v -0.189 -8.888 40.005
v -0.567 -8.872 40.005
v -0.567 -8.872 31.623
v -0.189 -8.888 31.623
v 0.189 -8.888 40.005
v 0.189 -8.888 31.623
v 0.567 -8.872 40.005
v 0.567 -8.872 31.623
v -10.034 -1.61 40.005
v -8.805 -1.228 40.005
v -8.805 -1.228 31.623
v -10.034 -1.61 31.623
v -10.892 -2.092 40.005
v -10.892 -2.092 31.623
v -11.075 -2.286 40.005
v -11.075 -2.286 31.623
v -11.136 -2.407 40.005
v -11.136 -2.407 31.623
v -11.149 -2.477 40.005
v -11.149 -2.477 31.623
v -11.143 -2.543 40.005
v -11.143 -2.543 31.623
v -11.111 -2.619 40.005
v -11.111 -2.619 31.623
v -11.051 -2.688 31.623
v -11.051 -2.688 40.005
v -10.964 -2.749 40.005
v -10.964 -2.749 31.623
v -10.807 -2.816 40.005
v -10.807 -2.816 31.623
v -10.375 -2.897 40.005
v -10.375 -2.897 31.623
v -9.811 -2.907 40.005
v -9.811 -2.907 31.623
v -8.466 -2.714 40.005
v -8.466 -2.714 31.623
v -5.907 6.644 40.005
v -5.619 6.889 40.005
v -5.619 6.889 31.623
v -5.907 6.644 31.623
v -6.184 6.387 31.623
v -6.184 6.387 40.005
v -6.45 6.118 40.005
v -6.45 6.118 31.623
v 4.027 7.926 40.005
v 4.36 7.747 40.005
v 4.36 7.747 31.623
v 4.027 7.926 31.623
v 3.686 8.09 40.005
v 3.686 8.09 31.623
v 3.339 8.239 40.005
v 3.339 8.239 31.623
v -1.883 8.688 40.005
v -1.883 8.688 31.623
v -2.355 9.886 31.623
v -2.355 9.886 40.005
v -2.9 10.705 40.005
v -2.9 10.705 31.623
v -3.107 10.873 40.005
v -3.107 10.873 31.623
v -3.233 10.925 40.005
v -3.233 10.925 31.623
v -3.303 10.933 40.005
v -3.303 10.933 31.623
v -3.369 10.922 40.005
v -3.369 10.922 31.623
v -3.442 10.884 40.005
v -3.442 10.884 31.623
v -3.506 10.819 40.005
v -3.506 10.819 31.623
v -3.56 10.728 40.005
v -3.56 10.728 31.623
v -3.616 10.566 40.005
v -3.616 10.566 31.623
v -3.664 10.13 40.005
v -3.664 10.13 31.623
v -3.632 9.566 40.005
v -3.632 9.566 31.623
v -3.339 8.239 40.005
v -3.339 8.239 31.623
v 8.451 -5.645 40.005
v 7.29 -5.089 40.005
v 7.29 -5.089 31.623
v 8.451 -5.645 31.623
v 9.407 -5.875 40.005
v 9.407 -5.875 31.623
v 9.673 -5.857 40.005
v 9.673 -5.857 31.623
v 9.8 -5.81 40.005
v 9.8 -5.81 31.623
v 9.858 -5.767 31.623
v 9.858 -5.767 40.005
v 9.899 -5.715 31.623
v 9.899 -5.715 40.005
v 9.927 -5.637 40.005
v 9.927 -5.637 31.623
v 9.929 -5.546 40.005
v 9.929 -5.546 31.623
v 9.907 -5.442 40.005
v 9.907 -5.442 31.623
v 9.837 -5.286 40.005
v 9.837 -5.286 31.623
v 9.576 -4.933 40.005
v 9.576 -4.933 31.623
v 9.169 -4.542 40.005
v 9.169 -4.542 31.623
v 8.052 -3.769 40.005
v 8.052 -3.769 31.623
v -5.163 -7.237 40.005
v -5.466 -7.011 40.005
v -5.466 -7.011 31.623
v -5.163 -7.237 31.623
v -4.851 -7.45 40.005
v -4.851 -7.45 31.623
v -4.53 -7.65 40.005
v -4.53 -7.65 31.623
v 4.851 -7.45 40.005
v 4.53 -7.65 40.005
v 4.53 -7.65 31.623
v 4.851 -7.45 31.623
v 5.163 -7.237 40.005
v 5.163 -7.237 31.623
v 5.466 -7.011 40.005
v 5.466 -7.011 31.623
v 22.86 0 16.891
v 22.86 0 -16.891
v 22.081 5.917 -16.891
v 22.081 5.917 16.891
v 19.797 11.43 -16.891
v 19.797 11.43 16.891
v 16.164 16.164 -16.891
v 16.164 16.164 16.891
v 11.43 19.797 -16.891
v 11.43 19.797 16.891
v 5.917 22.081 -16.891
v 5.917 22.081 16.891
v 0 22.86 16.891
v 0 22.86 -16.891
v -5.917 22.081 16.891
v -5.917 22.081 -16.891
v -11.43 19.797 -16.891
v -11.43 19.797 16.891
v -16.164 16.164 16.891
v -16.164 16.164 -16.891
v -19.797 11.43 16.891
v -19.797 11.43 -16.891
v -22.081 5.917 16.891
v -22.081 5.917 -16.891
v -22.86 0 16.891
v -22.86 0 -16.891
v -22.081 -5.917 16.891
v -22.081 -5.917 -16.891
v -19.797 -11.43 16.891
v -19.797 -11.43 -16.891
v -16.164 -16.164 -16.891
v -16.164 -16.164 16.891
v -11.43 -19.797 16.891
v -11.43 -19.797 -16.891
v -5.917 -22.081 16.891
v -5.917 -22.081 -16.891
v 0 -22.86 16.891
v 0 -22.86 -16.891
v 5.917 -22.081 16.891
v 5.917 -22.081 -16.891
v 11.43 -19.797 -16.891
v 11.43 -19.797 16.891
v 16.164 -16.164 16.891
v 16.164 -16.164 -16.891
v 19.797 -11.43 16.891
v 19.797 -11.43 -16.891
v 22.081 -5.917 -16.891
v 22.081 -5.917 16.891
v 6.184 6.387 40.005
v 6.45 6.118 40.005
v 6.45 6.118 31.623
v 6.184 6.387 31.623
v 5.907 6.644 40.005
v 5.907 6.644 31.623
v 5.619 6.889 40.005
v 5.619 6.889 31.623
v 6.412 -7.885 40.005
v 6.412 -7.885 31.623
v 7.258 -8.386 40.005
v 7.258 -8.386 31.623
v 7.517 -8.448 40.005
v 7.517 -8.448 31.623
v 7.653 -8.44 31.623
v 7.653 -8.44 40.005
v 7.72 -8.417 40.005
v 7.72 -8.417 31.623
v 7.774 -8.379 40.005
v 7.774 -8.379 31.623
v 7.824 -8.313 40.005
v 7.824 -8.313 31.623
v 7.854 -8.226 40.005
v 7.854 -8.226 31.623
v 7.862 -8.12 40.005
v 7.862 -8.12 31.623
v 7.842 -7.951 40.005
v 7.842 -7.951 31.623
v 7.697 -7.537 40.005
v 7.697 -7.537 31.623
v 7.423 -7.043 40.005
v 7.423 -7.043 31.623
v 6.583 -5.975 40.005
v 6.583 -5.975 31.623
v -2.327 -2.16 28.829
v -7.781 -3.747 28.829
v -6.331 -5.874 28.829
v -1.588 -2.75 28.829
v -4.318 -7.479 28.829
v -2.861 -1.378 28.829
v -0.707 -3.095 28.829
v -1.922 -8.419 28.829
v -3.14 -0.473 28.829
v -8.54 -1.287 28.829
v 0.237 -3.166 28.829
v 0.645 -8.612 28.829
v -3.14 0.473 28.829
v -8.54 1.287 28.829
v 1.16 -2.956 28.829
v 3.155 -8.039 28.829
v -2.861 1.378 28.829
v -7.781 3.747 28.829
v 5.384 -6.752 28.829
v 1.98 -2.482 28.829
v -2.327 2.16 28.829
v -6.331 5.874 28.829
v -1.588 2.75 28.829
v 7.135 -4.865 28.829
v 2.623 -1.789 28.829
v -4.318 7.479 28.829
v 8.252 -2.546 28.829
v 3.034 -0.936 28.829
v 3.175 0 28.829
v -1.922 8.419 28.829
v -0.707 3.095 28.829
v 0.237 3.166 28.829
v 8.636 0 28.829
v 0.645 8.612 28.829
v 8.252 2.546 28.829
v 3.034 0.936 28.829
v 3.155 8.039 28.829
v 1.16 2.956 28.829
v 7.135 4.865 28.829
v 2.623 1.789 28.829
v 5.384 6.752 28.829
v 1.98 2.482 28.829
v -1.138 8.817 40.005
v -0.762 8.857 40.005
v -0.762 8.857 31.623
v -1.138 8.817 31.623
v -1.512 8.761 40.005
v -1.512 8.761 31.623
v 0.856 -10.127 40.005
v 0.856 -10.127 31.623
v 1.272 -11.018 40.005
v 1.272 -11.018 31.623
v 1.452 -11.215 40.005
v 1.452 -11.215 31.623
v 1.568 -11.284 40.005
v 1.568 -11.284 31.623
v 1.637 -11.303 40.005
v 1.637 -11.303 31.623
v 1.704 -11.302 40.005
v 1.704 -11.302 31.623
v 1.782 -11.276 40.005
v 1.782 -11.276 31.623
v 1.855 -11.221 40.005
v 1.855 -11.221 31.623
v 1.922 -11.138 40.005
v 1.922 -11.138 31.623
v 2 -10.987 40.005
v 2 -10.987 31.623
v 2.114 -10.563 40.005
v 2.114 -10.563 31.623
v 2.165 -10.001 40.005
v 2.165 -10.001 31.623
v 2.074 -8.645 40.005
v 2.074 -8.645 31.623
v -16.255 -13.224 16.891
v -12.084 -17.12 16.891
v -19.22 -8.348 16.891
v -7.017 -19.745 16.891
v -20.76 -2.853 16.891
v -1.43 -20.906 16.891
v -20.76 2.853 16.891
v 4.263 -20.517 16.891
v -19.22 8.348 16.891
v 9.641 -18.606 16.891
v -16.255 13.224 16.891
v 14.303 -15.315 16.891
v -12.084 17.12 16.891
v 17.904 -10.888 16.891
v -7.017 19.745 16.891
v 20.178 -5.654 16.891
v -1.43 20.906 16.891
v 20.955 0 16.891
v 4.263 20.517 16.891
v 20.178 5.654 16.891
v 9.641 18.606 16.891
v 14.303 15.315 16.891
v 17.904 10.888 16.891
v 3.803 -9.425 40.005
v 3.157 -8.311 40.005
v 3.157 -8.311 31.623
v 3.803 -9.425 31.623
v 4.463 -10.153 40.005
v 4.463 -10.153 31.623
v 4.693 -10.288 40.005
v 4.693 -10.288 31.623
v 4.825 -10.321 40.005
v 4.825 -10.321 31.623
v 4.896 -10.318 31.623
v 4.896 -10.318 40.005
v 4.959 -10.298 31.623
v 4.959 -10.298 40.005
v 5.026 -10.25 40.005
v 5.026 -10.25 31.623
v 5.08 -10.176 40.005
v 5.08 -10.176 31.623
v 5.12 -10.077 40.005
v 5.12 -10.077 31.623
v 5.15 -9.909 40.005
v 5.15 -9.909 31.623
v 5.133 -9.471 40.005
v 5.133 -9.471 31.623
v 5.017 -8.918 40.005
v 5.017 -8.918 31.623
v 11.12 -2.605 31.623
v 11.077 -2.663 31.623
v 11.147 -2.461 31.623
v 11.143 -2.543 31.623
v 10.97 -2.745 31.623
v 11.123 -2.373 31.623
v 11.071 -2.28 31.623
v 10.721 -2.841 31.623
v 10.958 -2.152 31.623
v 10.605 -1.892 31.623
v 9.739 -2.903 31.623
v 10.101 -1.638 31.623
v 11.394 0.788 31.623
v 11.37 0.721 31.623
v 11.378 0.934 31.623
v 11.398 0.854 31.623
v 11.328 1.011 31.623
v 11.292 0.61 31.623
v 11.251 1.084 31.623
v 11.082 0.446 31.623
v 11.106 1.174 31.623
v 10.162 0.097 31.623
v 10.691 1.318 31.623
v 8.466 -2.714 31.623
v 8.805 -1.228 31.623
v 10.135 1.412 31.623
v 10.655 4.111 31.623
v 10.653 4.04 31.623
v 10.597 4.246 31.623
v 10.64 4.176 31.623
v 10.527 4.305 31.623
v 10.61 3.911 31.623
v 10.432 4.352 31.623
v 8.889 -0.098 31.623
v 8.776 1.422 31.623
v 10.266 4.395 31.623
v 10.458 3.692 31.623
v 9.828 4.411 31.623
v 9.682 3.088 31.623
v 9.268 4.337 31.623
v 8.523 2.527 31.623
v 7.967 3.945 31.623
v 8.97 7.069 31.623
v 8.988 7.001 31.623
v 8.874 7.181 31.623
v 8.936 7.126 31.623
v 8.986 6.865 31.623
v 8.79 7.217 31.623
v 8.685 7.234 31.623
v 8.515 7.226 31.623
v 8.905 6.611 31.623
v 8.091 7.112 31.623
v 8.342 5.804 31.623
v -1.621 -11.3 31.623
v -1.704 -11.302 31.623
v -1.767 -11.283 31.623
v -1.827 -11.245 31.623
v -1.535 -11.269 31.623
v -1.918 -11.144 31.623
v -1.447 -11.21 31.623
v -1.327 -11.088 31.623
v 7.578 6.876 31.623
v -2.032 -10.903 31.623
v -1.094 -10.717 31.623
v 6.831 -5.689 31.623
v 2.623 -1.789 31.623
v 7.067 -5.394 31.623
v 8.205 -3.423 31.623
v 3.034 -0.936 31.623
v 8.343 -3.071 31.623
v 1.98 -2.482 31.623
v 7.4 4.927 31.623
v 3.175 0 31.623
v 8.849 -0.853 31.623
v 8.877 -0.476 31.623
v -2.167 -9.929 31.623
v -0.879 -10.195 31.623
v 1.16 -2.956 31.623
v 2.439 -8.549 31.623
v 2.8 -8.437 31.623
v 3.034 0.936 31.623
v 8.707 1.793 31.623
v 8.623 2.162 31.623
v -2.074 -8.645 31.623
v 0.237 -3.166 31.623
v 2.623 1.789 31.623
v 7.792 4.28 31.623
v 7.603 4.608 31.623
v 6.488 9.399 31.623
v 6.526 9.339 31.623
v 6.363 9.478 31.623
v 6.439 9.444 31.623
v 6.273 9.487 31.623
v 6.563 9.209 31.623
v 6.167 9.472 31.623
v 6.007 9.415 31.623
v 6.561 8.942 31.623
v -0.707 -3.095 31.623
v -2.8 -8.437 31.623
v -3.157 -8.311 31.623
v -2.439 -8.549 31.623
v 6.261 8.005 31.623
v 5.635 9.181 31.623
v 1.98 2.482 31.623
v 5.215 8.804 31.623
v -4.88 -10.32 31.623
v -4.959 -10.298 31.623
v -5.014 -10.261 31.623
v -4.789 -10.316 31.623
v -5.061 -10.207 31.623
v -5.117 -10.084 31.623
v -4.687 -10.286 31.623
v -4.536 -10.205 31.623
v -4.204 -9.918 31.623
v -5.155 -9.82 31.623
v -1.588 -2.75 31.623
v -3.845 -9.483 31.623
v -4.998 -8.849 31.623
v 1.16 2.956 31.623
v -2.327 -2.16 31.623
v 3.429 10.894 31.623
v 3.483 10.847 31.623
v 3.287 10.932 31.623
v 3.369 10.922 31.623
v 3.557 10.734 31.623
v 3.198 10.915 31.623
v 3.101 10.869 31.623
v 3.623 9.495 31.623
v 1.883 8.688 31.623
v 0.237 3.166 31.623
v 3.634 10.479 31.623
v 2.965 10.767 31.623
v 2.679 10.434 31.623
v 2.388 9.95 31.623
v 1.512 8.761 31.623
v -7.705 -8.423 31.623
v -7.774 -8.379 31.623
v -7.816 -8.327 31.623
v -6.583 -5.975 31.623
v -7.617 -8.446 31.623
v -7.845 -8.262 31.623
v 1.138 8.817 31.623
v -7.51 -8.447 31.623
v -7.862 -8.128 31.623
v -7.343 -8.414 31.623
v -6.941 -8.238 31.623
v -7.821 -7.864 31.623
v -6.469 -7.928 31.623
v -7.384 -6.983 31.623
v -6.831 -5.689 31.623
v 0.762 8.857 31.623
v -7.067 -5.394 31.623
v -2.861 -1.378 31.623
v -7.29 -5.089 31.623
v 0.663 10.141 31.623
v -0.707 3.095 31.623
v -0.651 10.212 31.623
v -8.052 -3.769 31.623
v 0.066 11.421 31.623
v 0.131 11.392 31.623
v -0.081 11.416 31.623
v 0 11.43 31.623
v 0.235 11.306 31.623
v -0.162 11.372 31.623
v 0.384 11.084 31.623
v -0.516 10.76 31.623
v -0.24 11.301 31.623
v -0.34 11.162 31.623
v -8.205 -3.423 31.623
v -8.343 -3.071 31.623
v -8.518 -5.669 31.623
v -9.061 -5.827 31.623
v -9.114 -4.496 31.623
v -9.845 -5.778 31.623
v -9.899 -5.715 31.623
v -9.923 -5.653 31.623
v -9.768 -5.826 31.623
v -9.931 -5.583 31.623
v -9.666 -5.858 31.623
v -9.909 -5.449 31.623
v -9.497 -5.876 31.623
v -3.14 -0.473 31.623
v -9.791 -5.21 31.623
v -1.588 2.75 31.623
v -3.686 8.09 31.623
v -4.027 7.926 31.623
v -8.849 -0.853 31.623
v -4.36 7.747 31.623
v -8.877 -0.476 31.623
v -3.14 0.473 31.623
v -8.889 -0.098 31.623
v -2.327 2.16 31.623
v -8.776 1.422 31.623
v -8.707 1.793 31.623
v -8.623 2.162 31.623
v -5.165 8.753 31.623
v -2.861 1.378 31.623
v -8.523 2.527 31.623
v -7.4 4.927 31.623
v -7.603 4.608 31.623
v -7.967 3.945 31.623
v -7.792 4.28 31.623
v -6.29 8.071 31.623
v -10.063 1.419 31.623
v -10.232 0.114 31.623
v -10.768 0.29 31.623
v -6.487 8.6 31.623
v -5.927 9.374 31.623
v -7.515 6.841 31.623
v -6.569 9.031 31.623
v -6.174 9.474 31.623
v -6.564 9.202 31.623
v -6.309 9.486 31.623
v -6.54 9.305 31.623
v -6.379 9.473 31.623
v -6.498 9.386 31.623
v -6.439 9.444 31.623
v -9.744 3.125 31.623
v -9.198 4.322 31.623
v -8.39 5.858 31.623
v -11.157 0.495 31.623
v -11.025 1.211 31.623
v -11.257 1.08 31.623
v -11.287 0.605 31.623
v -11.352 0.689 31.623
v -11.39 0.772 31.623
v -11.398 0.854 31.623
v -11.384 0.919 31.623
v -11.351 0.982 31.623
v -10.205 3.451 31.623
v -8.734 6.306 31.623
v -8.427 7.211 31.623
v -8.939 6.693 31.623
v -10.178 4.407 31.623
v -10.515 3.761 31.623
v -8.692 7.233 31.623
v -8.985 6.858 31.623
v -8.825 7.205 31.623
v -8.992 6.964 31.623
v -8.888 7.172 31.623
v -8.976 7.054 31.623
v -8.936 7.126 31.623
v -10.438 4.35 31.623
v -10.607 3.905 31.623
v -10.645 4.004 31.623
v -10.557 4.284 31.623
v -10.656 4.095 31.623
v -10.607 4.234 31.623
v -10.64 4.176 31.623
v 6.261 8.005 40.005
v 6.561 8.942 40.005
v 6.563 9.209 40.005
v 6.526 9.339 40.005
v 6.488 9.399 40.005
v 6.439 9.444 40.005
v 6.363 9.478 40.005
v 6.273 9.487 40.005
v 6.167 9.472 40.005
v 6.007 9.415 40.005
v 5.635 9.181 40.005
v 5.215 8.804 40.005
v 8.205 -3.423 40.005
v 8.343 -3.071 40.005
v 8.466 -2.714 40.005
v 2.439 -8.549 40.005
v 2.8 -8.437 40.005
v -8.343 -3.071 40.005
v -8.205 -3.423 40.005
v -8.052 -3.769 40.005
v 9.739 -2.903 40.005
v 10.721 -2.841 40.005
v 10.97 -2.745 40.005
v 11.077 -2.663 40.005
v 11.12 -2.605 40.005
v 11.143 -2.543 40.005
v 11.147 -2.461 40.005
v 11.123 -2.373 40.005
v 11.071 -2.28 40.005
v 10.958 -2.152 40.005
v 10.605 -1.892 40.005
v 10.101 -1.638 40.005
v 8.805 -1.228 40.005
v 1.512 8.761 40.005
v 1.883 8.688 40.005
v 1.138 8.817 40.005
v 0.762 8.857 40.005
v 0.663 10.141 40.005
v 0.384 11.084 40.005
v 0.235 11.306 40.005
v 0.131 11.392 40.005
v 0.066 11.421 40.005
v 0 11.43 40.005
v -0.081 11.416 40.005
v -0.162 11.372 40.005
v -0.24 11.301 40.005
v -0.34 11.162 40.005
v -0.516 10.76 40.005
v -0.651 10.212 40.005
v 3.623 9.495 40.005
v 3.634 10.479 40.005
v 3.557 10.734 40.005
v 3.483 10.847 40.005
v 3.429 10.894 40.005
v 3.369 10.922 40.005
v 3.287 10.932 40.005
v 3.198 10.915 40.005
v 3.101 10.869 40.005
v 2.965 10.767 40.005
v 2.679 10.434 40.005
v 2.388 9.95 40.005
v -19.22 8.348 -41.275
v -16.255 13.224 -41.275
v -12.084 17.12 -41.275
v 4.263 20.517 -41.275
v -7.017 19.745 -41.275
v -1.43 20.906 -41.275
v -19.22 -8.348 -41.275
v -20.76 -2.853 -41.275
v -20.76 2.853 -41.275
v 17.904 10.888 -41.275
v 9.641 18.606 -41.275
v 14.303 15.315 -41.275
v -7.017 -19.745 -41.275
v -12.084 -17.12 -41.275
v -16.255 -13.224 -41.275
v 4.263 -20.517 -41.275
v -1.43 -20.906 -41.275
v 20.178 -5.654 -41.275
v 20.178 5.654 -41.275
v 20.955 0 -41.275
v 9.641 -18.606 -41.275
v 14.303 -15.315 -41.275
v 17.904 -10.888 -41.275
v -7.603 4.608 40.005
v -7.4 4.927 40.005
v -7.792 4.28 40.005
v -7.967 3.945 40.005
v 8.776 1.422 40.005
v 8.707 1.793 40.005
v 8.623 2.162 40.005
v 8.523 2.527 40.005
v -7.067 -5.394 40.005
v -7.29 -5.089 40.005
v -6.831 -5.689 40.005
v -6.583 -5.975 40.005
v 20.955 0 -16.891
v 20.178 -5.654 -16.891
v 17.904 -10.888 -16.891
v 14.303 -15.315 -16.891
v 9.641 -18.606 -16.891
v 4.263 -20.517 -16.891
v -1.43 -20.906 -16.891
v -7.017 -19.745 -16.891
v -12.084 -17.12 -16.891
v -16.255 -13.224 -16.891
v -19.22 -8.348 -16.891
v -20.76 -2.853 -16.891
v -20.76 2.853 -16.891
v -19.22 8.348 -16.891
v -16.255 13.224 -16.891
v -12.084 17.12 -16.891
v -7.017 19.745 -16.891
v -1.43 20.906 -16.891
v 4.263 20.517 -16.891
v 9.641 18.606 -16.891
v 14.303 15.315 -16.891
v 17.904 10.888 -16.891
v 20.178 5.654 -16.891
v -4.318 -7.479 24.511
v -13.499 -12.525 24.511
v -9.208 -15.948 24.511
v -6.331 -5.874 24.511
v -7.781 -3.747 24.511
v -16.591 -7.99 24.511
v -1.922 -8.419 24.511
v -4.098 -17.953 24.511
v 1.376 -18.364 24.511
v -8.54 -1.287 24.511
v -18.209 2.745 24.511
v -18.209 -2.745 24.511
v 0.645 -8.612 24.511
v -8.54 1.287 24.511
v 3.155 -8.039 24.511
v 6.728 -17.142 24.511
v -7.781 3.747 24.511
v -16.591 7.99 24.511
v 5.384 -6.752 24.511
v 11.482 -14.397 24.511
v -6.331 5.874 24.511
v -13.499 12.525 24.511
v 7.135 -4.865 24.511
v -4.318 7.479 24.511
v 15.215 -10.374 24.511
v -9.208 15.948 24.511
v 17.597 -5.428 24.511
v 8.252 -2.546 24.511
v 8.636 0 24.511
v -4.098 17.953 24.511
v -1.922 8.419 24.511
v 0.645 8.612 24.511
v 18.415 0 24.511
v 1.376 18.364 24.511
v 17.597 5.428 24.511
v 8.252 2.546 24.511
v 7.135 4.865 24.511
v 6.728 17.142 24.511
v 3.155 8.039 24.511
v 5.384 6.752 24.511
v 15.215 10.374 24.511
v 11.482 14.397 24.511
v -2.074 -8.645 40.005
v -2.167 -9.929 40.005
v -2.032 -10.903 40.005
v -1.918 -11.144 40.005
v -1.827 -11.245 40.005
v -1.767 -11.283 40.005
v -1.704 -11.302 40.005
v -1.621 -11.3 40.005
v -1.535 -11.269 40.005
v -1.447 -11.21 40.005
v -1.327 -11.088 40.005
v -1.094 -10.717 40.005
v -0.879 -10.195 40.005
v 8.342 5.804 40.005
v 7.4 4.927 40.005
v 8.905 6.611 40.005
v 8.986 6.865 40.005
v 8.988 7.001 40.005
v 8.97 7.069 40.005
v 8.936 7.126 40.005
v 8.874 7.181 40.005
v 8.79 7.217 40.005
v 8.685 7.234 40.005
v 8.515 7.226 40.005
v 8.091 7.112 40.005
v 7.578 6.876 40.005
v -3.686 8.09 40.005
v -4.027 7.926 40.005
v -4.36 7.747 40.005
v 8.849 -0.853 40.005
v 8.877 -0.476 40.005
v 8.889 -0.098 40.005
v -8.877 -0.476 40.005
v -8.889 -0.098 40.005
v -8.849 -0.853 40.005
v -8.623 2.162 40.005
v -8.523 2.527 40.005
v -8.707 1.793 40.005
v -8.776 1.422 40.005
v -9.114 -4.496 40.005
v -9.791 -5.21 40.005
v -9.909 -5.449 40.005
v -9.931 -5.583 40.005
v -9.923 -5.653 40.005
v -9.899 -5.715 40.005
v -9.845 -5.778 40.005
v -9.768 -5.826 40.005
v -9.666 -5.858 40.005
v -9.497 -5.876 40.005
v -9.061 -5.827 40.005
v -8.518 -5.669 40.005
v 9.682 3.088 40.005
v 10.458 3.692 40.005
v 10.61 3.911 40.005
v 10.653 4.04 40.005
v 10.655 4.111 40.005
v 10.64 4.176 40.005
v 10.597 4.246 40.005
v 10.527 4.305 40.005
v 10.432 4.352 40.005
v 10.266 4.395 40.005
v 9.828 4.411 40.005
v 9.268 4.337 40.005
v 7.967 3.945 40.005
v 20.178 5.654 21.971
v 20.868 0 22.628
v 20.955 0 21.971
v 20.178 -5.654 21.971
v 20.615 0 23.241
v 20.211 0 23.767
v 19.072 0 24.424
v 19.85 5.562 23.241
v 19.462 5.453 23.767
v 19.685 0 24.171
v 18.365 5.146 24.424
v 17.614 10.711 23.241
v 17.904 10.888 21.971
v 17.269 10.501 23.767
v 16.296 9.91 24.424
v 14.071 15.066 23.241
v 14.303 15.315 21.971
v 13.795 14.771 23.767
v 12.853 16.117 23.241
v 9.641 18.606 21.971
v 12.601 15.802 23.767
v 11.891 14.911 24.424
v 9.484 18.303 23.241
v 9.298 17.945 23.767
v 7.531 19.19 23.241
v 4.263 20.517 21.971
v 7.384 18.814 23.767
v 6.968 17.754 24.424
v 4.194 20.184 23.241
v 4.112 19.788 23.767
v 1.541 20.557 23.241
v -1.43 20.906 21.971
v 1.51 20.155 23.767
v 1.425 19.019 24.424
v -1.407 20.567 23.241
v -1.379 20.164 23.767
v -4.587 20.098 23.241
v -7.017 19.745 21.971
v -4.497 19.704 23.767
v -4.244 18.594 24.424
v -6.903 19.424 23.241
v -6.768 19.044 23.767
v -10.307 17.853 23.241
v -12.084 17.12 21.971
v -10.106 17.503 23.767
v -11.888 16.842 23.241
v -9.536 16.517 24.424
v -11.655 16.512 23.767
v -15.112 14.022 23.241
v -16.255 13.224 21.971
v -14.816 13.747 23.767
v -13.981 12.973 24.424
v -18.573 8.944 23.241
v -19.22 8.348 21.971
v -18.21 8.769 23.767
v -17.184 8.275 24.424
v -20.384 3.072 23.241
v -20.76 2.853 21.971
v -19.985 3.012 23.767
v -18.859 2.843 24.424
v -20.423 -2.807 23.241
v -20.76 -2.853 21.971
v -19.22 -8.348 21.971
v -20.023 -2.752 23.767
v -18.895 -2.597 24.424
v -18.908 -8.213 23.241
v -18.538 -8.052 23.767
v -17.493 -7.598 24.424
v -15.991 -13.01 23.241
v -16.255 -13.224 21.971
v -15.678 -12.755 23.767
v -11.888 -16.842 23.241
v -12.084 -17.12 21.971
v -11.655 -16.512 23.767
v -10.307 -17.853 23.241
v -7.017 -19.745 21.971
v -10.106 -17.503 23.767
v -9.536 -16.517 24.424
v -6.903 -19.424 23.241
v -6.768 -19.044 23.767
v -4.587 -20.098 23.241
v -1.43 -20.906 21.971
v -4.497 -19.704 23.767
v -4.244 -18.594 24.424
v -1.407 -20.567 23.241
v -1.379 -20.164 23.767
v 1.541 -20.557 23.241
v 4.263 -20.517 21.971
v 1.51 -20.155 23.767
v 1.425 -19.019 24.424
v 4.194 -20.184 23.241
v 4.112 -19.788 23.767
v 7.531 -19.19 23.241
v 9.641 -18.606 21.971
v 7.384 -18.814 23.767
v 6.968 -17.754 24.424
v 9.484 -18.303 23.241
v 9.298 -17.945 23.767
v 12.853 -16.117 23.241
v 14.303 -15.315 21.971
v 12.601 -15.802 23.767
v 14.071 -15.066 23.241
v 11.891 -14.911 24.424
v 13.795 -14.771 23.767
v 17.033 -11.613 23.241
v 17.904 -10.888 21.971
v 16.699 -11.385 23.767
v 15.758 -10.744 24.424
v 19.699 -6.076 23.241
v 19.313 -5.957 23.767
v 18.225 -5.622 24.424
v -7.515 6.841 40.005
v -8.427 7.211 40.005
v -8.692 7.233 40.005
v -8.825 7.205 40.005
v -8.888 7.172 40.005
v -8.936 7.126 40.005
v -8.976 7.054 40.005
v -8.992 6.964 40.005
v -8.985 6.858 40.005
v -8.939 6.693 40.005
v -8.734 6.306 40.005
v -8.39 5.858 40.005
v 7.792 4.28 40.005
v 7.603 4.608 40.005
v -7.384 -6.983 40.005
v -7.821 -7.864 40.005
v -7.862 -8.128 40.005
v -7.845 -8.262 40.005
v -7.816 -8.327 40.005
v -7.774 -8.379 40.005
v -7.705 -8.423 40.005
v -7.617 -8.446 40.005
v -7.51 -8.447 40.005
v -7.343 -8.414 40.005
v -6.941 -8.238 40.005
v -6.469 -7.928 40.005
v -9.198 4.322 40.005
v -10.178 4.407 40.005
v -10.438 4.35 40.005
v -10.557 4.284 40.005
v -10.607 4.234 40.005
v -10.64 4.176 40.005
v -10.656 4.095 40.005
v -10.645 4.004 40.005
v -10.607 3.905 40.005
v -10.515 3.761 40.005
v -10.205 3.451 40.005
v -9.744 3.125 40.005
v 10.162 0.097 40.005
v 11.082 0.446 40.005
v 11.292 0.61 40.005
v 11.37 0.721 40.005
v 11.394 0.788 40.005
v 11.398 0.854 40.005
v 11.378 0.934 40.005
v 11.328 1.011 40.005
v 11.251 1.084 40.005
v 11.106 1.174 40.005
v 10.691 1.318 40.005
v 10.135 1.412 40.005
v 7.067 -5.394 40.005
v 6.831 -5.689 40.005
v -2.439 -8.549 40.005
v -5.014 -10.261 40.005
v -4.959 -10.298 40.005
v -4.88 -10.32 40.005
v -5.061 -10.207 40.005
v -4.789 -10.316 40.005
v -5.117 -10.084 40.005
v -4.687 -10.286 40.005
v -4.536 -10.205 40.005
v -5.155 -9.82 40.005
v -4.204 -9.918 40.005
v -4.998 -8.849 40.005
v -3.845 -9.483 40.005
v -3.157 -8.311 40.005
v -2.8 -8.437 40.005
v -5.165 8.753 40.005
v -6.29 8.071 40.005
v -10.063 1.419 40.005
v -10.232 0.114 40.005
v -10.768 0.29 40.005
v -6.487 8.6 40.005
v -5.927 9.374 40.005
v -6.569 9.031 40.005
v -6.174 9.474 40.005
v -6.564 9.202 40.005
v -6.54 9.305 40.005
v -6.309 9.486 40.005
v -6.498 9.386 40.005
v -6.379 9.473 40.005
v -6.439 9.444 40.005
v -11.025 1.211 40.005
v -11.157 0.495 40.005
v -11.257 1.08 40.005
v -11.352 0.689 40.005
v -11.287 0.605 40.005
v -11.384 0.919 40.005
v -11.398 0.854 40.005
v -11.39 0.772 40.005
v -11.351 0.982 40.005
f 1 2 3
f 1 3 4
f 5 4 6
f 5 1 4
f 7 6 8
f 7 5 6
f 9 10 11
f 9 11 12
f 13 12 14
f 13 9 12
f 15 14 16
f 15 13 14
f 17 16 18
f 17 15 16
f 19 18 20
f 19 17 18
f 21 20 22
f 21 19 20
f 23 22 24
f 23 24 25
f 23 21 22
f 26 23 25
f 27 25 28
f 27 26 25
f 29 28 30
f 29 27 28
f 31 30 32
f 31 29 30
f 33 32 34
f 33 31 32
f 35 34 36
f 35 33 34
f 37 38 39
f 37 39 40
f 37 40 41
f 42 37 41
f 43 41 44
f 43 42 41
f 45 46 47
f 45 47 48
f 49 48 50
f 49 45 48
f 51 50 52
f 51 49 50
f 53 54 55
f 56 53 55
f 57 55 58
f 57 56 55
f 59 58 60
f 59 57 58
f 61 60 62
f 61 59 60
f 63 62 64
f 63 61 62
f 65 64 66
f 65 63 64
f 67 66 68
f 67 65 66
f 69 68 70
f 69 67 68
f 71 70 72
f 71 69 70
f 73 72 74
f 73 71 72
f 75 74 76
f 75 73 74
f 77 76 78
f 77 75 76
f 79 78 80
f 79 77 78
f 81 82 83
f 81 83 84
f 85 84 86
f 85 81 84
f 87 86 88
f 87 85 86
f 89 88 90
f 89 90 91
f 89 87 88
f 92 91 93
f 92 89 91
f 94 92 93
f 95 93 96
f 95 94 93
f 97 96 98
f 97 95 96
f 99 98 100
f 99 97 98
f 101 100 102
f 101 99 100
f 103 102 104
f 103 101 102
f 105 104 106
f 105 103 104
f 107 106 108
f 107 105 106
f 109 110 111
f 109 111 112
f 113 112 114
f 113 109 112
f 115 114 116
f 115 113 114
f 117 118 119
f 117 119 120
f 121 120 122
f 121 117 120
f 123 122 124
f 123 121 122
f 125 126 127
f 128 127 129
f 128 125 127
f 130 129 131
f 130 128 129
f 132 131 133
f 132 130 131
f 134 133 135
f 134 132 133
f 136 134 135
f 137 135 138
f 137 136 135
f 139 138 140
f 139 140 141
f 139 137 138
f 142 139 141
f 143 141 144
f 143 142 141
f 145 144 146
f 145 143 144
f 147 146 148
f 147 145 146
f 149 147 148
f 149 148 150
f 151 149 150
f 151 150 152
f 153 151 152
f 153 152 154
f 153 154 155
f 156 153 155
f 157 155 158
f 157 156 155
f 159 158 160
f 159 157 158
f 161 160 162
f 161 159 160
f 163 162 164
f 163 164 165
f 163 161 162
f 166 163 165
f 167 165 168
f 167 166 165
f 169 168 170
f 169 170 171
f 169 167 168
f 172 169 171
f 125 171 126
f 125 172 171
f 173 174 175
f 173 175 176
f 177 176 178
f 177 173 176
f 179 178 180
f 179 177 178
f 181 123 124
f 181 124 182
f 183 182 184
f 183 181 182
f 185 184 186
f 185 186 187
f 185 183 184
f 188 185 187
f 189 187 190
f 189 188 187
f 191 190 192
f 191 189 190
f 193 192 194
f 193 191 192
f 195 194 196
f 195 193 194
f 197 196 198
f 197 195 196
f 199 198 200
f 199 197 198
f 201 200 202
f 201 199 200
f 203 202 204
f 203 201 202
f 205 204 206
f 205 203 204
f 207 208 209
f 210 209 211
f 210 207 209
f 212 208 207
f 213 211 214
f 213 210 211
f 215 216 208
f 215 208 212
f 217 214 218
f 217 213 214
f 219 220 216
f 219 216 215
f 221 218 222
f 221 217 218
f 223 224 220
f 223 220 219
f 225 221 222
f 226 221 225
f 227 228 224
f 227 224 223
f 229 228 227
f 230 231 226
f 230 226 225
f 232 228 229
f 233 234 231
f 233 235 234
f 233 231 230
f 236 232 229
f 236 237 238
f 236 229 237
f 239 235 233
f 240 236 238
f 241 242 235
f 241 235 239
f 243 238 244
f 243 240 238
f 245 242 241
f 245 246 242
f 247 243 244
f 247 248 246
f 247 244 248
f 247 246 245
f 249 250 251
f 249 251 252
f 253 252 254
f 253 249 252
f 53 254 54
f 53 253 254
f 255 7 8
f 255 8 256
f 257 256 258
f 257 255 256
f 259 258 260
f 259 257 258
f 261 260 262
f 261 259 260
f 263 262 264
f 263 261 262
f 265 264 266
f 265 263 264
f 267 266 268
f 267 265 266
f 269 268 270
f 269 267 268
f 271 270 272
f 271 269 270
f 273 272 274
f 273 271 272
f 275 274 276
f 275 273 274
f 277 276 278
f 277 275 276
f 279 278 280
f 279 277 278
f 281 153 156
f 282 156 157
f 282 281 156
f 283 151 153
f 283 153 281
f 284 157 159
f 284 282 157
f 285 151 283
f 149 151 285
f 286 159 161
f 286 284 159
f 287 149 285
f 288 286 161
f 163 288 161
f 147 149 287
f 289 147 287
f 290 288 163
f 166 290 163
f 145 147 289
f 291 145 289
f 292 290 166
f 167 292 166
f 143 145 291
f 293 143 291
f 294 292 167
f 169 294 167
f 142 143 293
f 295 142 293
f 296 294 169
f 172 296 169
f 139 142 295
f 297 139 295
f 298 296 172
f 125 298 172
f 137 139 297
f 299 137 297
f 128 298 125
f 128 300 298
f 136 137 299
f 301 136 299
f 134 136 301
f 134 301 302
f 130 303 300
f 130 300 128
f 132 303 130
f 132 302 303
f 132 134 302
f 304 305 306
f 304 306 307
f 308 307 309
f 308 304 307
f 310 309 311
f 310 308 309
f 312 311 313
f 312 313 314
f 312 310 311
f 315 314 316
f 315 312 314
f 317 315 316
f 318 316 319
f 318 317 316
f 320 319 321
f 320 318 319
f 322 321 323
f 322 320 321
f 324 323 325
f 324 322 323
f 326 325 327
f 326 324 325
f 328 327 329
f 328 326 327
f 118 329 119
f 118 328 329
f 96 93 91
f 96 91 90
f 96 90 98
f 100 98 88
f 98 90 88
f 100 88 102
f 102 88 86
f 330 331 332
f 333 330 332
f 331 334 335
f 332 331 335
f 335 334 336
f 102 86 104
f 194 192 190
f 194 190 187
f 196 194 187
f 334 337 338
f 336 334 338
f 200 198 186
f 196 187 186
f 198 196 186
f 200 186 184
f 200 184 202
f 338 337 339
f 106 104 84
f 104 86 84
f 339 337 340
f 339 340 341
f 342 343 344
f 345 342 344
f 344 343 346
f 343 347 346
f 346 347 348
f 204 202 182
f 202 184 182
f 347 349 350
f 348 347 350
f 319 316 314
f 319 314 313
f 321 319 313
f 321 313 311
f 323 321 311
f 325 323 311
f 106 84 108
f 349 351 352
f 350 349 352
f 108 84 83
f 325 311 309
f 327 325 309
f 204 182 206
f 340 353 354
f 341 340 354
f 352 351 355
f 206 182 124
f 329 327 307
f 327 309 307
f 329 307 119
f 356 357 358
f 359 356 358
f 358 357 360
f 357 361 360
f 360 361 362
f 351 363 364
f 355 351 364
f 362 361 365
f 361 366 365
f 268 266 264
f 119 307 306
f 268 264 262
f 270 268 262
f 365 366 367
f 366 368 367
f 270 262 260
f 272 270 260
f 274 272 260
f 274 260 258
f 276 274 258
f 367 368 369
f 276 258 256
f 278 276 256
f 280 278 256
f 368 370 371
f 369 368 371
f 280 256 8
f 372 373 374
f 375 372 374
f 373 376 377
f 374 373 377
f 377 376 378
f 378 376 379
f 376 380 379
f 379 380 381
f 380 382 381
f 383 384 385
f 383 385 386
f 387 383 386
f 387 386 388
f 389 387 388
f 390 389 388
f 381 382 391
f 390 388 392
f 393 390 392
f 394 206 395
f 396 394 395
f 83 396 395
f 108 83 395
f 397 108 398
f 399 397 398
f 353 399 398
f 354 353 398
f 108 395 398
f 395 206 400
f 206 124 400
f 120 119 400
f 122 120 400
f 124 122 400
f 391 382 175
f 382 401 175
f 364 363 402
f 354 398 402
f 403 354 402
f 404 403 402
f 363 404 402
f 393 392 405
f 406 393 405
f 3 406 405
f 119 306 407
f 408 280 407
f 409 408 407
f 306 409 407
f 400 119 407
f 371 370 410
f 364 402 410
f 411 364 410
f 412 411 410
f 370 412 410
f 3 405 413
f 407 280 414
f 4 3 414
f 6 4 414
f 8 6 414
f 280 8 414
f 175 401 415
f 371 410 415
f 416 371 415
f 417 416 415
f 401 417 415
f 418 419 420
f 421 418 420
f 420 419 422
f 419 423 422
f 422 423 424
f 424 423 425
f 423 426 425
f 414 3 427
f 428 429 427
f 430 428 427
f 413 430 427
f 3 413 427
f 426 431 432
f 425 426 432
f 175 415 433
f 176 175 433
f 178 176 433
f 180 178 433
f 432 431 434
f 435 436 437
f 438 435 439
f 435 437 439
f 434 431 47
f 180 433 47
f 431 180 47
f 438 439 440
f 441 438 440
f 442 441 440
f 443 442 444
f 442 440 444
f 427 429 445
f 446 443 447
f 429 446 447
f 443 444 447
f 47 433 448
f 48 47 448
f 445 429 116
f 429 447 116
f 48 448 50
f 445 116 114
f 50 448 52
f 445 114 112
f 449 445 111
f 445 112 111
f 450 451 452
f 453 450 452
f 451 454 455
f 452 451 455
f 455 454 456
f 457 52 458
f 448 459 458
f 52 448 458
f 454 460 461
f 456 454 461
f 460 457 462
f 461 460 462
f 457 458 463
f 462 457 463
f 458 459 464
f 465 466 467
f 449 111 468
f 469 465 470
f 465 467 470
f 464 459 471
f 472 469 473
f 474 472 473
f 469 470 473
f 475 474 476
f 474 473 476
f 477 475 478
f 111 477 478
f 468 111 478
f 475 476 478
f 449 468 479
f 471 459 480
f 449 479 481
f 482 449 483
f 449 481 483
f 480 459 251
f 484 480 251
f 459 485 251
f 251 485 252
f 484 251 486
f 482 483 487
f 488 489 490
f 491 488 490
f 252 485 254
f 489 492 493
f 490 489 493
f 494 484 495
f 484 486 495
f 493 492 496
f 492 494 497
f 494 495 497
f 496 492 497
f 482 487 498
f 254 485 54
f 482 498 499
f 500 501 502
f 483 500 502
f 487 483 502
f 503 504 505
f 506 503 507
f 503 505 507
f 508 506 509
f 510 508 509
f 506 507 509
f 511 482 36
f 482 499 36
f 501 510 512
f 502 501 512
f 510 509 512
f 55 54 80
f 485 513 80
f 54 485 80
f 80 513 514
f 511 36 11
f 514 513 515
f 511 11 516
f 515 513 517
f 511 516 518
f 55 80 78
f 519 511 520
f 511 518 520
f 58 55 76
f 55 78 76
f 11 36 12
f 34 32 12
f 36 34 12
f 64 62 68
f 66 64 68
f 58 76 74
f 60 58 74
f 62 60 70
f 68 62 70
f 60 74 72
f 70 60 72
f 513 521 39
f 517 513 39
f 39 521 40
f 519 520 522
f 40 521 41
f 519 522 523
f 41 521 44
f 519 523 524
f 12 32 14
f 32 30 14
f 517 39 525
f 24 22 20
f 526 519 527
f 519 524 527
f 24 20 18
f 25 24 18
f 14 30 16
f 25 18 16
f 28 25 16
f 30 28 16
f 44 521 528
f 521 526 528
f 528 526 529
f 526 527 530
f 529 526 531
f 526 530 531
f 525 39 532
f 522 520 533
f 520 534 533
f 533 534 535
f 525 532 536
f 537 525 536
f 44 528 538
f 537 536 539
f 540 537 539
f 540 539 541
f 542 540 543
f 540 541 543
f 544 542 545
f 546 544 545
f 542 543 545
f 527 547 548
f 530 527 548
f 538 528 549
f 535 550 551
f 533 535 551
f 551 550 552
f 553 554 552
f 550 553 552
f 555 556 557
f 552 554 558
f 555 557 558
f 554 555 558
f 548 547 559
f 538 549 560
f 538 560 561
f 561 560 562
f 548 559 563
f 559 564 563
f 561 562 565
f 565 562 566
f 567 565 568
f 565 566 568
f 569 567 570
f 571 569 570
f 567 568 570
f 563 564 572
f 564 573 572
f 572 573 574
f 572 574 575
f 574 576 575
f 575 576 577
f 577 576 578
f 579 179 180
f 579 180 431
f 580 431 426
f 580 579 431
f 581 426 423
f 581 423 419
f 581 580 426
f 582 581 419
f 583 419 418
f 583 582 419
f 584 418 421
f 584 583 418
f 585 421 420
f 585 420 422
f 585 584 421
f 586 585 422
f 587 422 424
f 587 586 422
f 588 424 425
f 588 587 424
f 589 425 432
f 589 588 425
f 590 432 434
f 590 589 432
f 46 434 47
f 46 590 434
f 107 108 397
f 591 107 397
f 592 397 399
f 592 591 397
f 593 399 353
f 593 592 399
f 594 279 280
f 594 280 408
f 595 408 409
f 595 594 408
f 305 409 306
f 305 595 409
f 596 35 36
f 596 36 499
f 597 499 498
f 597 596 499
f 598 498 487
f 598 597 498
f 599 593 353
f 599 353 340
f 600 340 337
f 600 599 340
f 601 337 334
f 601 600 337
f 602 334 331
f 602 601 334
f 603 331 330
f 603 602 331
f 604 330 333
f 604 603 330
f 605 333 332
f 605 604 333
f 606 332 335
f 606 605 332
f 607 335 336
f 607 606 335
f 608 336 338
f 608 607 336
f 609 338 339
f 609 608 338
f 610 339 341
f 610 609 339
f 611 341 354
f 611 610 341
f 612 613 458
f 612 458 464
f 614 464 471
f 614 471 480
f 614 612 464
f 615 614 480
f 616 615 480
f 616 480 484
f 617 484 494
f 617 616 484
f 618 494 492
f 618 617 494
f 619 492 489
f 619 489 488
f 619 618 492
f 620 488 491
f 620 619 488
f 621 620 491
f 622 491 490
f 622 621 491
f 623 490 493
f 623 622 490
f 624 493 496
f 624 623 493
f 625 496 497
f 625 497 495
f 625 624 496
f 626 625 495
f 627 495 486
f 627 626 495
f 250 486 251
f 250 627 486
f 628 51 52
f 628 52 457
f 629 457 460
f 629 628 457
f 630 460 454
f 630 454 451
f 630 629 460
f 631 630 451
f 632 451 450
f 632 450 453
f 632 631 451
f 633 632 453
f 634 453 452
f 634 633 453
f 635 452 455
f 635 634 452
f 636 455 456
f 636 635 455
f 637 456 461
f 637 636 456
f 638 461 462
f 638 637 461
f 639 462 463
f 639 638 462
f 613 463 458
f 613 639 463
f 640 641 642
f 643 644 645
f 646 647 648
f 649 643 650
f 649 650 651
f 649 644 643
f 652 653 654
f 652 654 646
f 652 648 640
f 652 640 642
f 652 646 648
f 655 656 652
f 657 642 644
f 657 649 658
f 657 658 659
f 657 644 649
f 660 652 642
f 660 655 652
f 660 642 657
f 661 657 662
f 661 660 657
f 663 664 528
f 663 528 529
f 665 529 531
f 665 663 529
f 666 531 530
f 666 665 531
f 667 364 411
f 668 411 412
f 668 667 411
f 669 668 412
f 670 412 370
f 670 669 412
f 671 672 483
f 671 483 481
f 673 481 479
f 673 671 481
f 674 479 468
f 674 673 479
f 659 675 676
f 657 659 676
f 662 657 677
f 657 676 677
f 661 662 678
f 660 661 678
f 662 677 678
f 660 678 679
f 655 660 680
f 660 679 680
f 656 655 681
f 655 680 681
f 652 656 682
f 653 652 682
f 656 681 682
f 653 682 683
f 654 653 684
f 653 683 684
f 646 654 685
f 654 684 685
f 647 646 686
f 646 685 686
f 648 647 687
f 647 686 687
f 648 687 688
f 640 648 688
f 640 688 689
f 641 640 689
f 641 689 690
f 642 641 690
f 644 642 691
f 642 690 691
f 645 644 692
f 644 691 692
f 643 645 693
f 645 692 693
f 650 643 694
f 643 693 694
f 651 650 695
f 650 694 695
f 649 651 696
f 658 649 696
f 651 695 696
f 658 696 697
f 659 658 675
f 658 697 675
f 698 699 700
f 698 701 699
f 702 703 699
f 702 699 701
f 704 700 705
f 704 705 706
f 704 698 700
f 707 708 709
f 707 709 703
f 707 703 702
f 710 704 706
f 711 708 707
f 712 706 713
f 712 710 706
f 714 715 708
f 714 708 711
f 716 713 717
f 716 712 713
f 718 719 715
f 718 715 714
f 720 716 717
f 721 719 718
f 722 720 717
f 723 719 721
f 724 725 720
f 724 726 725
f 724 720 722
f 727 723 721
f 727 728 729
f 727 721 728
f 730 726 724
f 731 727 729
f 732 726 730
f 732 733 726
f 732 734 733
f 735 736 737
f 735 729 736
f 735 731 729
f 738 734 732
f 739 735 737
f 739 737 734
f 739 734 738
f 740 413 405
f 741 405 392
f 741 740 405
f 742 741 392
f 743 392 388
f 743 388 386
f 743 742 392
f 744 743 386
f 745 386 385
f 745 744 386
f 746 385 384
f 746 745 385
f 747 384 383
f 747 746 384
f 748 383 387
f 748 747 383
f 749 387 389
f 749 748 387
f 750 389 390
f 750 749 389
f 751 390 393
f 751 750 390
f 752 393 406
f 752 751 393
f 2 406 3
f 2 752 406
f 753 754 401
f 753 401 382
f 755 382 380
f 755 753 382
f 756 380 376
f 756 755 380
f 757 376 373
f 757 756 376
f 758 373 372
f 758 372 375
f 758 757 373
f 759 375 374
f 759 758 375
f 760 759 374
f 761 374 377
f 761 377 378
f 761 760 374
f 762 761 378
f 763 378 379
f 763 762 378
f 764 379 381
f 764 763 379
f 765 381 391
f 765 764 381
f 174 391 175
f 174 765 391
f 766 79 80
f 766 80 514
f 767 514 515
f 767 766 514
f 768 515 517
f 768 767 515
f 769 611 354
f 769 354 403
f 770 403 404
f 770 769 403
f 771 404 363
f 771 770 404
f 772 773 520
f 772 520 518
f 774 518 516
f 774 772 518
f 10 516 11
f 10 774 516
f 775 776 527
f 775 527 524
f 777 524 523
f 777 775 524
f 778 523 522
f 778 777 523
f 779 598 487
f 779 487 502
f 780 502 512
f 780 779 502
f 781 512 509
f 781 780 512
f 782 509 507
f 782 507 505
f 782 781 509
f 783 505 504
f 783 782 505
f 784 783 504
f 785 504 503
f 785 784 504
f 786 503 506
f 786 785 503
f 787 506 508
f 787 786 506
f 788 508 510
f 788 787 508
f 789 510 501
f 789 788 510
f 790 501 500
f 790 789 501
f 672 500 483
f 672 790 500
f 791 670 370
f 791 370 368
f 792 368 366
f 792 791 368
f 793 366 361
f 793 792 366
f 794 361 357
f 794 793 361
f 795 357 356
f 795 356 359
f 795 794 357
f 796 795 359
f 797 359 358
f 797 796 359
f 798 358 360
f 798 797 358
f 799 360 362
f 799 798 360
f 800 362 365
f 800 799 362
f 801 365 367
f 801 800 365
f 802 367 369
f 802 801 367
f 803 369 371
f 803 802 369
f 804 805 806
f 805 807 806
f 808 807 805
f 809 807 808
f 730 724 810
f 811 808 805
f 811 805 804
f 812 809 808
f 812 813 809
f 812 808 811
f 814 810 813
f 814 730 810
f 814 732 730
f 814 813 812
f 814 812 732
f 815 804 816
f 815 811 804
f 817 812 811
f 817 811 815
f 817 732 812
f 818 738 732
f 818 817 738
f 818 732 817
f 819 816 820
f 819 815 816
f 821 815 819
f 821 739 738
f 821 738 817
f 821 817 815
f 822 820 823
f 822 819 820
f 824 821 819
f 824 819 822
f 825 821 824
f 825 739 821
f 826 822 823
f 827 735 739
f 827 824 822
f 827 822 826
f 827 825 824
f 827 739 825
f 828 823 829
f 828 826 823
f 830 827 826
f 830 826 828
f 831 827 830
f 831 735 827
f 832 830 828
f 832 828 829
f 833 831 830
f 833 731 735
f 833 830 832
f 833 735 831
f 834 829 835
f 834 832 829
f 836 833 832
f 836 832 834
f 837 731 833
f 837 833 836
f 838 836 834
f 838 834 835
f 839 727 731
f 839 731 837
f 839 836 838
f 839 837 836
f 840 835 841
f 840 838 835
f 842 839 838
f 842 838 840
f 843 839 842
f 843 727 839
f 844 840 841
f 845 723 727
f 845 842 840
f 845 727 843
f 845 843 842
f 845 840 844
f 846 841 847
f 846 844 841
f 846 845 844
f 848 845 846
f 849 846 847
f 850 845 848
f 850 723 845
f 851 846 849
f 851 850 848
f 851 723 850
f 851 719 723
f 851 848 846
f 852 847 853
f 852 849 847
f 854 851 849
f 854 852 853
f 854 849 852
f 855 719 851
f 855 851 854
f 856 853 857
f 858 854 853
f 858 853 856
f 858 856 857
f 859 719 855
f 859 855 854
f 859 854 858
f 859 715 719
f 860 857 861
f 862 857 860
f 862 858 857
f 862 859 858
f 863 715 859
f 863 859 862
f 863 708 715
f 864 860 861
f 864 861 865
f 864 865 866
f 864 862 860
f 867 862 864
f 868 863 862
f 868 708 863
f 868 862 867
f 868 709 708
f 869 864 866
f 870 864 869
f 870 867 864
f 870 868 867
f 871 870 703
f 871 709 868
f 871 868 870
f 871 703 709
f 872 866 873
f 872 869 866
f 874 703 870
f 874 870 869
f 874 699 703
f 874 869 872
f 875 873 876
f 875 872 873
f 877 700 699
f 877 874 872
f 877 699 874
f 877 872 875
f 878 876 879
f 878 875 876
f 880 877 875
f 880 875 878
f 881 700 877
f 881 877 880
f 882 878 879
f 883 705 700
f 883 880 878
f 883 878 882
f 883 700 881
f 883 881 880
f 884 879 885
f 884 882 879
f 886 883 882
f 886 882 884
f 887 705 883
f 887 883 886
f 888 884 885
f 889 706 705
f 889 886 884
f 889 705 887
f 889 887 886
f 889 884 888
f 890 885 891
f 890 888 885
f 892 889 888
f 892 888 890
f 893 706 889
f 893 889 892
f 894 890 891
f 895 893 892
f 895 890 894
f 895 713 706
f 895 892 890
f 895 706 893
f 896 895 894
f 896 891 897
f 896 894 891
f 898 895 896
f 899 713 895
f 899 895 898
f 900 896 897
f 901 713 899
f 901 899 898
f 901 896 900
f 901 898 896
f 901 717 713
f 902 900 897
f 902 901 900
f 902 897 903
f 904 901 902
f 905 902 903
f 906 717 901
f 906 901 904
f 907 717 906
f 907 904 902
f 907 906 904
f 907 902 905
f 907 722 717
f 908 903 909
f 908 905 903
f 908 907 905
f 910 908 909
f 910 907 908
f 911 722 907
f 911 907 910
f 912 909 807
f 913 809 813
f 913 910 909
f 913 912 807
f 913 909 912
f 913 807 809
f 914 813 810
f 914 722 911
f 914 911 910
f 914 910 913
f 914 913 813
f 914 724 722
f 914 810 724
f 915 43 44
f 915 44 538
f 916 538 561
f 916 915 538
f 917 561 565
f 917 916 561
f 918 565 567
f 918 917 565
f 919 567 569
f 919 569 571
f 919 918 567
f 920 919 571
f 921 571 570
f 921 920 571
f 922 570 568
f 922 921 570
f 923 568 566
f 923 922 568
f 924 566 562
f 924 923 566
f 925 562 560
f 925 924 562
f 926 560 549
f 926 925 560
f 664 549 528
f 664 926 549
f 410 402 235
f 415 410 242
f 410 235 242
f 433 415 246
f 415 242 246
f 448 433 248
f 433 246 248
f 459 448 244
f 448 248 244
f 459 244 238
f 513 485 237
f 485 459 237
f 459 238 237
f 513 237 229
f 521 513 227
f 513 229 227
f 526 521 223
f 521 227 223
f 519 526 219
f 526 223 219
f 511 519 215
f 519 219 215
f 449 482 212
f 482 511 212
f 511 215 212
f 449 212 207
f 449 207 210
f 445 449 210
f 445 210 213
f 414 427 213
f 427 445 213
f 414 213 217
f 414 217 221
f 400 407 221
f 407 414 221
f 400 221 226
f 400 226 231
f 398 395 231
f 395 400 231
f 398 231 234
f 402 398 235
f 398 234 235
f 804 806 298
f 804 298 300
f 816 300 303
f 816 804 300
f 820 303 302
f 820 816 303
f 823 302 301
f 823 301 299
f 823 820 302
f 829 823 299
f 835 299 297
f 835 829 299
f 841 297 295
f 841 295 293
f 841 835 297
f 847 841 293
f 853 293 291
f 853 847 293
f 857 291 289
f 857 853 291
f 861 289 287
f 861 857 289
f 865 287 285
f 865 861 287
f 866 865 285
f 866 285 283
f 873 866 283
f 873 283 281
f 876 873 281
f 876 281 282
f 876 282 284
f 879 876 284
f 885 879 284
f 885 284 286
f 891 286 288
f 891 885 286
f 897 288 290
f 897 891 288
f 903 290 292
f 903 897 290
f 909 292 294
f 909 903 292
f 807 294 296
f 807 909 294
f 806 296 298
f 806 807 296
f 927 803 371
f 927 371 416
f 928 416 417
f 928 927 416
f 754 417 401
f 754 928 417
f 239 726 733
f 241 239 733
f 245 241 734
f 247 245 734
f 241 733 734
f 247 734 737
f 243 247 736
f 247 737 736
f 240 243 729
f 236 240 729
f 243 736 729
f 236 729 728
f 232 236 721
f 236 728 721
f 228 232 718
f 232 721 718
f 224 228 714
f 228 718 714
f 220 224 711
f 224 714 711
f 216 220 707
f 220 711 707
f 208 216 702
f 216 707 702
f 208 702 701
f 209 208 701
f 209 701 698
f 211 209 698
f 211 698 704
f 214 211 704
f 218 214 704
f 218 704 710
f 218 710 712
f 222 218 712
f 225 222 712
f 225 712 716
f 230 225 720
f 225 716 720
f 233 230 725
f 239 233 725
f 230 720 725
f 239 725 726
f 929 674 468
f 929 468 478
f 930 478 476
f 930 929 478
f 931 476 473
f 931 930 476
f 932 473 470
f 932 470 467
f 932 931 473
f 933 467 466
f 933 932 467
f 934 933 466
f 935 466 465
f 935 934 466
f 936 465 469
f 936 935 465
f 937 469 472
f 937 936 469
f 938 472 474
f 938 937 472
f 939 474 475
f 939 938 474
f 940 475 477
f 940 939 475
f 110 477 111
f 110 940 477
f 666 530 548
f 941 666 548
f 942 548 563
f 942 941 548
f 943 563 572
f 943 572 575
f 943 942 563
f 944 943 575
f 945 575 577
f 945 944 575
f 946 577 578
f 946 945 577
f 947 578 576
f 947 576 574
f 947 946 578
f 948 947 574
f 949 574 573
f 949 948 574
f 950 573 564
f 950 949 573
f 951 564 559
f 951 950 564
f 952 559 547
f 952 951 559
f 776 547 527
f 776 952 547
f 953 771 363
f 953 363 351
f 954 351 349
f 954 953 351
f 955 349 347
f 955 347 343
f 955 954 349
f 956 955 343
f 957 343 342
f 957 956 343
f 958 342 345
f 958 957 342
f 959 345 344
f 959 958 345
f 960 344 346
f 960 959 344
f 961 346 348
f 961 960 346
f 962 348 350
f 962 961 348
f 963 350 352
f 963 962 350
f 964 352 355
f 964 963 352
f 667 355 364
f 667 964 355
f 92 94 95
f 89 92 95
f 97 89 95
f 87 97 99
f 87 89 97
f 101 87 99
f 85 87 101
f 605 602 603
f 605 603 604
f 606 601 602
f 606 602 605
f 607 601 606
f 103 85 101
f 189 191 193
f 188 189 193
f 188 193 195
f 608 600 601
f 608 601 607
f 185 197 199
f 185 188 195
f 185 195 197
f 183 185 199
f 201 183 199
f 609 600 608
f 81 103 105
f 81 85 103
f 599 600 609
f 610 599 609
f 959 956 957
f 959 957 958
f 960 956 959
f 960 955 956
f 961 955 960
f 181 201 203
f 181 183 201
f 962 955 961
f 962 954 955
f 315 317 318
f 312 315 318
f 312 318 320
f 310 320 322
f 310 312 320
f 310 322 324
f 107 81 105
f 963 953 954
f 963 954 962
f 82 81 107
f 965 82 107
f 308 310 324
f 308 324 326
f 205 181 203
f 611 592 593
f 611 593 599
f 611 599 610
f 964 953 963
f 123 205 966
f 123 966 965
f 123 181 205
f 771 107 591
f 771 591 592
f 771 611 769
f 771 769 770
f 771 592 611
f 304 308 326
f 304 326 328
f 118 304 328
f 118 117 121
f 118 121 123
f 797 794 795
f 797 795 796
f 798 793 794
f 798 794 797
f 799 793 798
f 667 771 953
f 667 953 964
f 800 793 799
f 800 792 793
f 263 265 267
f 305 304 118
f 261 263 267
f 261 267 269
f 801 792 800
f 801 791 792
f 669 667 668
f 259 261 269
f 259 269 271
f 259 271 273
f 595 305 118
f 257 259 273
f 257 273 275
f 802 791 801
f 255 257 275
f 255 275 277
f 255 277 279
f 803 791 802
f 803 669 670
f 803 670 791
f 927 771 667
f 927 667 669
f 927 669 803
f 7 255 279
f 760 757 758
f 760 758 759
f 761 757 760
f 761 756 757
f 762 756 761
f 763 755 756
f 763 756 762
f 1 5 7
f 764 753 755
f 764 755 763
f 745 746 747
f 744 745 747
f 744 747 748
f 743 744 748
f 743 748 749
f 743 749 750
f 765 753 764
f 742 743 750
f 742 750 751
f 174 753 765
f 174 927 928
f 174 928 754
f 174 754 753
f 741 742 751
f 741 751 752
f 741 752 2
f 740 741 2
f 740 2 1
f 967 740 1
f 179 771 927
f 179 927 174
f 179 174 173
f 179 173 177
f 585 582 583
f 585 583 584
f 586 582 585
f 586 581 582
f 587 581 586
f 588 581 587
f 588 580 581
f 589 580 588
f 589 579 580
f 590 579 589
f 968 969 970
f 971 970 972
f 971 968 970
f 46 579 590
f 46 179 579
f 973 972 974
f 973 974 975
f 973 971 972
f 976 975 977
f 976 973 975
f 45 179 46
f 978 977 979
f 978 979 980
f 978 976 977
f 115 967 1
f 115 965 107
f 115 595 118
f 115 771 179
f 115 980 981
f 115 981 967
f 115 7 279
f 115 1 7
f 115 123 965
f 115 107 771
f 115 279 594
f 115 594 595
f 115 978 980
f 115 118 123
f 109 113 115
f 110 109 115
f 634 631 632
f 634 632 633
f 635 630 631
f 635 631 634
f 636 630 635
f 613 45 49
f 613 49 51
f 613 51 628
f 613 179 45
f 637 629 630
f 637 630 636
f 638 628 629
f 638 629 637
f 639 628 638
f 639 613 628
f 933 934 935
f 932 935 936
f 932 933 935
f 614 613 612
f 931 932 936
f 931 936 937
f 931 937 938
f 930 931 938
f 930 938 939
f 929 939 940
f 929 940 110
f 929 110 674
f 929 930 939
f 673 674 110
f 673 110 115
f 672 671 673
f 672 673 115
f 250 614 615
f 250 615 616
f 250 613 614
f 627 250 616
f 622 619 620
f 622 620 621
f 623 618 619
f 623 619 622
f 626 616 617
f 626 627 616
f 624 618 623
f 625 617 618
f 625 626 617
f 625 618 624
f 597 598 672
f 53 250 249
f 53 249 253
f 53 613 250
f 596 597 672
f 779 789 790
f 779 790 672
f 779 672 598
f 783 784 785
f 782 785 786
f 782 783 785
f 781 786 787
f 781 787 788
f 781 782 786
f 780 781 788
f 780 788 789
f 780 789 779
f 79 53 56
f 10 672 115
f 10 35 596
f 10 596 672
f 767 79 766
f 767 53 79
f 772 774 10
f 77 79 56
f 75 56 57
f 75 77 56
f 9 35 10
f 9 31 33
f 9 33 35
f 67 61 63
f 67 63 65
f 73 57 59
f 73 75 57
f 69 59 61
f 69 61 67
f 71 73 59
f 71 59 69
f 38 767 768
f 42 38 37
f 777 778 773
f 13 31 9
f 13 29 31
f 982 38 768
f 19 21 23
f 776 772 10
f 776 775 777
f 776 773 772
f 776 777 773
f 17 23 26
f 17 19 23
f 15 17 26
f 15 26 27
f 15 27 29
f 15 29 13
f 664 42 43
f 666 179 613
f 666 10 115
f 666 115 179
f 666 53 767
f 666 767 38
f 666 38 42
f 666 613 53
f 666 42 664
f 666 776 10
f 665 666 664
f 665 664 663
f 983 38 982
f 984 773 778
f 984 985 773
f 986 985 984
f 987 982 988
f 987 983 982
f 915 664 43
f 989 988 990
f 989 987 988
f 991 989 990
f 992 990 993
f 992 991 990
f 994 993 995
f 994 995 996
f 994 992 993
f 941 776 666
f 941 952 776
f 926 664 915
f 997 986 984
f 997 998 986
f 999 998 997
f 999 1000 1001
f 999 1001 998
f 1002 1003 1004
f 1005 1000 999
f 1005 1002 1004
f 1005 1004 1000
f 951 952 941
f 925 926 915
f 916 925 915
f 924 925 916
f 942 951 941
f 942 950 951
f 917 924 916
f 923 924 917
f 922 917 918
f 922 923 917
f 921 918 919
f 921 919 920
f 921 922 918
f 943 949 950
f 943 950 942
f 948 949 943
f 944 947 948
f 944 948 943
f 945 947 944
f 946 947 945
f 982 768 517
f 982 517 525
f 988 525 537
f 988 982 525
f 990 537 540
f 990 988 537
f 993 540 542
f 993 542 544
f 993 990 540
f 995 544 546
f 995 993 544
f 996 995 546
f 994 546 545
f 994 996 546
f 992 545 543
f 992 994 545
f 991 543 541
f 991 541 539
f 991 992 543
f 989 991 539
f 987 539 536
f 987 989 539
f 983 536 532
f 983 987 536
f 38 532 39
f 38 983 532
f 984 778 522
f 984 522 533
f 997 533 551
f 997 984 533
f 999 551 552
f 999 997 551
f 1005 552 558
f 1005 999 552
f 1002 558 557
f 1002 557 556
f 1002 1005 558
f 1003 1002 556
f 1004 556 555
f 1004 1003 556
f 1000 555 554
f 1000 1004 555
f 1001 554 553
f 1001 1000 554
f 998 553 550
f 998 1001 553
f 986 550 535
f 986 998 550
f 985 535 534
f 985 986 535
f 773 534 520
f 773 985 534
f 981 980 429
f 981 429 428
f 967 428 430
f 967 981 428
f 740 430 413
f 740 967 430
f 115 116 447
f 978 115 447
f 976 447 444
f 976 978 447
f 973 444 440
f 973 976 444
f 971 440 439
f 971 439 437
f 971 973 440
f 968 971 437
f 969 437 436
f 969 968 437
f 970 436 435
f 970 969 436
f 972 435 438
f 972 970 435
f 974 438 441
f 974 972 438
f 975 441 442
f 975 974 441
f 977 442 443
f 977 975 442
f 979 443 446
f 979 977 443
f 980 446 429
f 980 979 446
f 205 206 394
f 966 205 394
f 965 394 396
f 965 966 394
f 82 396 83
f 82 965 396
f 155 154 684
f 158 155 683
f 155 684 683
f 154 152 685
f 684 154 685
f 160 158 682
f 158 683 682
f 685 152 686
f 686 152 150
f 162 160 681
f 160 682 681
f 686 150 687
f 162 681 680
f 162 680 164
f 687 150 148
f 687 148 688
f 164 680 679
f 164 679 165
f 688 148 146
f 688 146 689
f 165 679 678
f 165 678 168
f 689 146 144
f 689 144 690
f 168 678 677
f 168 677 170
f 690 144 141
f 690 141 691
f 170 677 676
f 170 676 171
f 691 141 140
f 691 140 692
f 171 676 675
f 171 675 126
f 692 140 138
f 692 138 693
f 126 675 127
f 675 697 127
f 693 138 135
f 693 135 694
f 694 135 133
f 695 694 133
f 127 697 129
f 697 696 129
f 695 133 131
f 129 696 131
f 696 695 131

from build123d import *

# Parameters (mm, degrees)
SKETCH1_R           = 22.86
BOSS_EXTRUDE1_DEPTH = 16.891
SKETCH2_R           = 20.955
BOSS_EXTRUDE2_DEPTH = 24.384
BOSS_EXTRUDE3_START = 7.62
SKETCH3_R           = 20.955
BOSS_EXTRUDE3_DEPTH = 7.62
SKETCH4_R           = 8.636
BOSS_EXTRUDE4_DEPTH = 4.318
FILLET1_R           = 2.54
SKETCH5_R           = 3.175
BOSS_EXTRUDE6_DEPTH = 11.176
SKETCH6_R           = 8.89
BOSS_EXTRUDE7_DEPTH = 8.382
SKETCH7_RX          = 2.54
SKETCH7_RY          = 0.762
BOSS_EXTRUDE8_DEPTH = 8.382
CIRPATTERN1_COUNT   = 21


with BuildPart() as part:
    # Sketch1 → Boss-Extrude1 (new, symmetric)
    with BuildSketch(Plane.XY):
        Circle(SKETCH1_R)
    extrude(amount=BOSS_EXTRUDE1_DEPTH, both=True)

    # Sketch2 → Boss-Extrude2 (add)
    with BuildSketch(Plane(origin=(0, 0, -16.891), x_dir=(-1, 0, 0), z_dir=(0, 0, -1))):
        with Locations(Location((0, 0, 0), (0, 0, 180))):
            Circle(SKETCH2_R)
    extrude(amount=BOSS_EXTRUDE2_DEPTH)

    # Sketch3 → Boss-Extrude3 (add)
    with BuildSketch(Plane.XY.offset(16.891).offset(BOSS_EXTRUDE3_START)):
        Circle(SKETCH3_R)
    extrude(amount=-BOSS_EXTRUDE3_DEPTH)

    # Sketch4 → Boss-Extrude4 (add)
    with BuildSketch(Plane.XY.offset(24.511)):
        Circle(SKETCH4_R)
    extrude(amount=BOSS_EXTRUDE4_DEPTH)

    # Fillet1
    fillet1_edges = [part.edges().sort_by_distance(p)[0] for p in [
        (-20.955, 0, 24.511),
    ]]
    fillet(fillet1_edges, radius=FILLET1_R)

    # Sketch5 → Boss-Extrude6 (add)
    with BuildSketch(Plane.XY.offset(28.829)):
        Circle(SKETCH5_R)
    extrude(amount=BOSS_EXTRUDE6_DEPTH)

    # Sketch6 → Boss-Extrude7 (add)
    with BuildSketch(Plane.XY.offset(40.005)):
        Circle(SKETCH6_R)
    extrude(amount=-BOSS_EXTRUDE7_DEPTH)

    # Sketch7 → Boss-Extrude8 (add)
    with BuildSketch(Plane.XY.offset(40.005)):
        with Locations(Location((0, 8.89), (0, 0, 90))):
            Ellipse(SKETCH7_RX, SKETCH7_RY)
    boss_extrude8 = extrude(amount=-BOSS_EXTRUDE8_DEPTH)

    # CirPattern1: Boss-Extrude8 ×21 about axis
    cirpattern1_axis = Axis((0, 0, 44.069), (0, 0, -1))
    for i in range(1, CIRPATTERN1_COUNT):
        add(boss_extrude8.rotate(cirpattern1_axis, i * 360 / CIRPATTERN1_COUNT))


solid = part.part
